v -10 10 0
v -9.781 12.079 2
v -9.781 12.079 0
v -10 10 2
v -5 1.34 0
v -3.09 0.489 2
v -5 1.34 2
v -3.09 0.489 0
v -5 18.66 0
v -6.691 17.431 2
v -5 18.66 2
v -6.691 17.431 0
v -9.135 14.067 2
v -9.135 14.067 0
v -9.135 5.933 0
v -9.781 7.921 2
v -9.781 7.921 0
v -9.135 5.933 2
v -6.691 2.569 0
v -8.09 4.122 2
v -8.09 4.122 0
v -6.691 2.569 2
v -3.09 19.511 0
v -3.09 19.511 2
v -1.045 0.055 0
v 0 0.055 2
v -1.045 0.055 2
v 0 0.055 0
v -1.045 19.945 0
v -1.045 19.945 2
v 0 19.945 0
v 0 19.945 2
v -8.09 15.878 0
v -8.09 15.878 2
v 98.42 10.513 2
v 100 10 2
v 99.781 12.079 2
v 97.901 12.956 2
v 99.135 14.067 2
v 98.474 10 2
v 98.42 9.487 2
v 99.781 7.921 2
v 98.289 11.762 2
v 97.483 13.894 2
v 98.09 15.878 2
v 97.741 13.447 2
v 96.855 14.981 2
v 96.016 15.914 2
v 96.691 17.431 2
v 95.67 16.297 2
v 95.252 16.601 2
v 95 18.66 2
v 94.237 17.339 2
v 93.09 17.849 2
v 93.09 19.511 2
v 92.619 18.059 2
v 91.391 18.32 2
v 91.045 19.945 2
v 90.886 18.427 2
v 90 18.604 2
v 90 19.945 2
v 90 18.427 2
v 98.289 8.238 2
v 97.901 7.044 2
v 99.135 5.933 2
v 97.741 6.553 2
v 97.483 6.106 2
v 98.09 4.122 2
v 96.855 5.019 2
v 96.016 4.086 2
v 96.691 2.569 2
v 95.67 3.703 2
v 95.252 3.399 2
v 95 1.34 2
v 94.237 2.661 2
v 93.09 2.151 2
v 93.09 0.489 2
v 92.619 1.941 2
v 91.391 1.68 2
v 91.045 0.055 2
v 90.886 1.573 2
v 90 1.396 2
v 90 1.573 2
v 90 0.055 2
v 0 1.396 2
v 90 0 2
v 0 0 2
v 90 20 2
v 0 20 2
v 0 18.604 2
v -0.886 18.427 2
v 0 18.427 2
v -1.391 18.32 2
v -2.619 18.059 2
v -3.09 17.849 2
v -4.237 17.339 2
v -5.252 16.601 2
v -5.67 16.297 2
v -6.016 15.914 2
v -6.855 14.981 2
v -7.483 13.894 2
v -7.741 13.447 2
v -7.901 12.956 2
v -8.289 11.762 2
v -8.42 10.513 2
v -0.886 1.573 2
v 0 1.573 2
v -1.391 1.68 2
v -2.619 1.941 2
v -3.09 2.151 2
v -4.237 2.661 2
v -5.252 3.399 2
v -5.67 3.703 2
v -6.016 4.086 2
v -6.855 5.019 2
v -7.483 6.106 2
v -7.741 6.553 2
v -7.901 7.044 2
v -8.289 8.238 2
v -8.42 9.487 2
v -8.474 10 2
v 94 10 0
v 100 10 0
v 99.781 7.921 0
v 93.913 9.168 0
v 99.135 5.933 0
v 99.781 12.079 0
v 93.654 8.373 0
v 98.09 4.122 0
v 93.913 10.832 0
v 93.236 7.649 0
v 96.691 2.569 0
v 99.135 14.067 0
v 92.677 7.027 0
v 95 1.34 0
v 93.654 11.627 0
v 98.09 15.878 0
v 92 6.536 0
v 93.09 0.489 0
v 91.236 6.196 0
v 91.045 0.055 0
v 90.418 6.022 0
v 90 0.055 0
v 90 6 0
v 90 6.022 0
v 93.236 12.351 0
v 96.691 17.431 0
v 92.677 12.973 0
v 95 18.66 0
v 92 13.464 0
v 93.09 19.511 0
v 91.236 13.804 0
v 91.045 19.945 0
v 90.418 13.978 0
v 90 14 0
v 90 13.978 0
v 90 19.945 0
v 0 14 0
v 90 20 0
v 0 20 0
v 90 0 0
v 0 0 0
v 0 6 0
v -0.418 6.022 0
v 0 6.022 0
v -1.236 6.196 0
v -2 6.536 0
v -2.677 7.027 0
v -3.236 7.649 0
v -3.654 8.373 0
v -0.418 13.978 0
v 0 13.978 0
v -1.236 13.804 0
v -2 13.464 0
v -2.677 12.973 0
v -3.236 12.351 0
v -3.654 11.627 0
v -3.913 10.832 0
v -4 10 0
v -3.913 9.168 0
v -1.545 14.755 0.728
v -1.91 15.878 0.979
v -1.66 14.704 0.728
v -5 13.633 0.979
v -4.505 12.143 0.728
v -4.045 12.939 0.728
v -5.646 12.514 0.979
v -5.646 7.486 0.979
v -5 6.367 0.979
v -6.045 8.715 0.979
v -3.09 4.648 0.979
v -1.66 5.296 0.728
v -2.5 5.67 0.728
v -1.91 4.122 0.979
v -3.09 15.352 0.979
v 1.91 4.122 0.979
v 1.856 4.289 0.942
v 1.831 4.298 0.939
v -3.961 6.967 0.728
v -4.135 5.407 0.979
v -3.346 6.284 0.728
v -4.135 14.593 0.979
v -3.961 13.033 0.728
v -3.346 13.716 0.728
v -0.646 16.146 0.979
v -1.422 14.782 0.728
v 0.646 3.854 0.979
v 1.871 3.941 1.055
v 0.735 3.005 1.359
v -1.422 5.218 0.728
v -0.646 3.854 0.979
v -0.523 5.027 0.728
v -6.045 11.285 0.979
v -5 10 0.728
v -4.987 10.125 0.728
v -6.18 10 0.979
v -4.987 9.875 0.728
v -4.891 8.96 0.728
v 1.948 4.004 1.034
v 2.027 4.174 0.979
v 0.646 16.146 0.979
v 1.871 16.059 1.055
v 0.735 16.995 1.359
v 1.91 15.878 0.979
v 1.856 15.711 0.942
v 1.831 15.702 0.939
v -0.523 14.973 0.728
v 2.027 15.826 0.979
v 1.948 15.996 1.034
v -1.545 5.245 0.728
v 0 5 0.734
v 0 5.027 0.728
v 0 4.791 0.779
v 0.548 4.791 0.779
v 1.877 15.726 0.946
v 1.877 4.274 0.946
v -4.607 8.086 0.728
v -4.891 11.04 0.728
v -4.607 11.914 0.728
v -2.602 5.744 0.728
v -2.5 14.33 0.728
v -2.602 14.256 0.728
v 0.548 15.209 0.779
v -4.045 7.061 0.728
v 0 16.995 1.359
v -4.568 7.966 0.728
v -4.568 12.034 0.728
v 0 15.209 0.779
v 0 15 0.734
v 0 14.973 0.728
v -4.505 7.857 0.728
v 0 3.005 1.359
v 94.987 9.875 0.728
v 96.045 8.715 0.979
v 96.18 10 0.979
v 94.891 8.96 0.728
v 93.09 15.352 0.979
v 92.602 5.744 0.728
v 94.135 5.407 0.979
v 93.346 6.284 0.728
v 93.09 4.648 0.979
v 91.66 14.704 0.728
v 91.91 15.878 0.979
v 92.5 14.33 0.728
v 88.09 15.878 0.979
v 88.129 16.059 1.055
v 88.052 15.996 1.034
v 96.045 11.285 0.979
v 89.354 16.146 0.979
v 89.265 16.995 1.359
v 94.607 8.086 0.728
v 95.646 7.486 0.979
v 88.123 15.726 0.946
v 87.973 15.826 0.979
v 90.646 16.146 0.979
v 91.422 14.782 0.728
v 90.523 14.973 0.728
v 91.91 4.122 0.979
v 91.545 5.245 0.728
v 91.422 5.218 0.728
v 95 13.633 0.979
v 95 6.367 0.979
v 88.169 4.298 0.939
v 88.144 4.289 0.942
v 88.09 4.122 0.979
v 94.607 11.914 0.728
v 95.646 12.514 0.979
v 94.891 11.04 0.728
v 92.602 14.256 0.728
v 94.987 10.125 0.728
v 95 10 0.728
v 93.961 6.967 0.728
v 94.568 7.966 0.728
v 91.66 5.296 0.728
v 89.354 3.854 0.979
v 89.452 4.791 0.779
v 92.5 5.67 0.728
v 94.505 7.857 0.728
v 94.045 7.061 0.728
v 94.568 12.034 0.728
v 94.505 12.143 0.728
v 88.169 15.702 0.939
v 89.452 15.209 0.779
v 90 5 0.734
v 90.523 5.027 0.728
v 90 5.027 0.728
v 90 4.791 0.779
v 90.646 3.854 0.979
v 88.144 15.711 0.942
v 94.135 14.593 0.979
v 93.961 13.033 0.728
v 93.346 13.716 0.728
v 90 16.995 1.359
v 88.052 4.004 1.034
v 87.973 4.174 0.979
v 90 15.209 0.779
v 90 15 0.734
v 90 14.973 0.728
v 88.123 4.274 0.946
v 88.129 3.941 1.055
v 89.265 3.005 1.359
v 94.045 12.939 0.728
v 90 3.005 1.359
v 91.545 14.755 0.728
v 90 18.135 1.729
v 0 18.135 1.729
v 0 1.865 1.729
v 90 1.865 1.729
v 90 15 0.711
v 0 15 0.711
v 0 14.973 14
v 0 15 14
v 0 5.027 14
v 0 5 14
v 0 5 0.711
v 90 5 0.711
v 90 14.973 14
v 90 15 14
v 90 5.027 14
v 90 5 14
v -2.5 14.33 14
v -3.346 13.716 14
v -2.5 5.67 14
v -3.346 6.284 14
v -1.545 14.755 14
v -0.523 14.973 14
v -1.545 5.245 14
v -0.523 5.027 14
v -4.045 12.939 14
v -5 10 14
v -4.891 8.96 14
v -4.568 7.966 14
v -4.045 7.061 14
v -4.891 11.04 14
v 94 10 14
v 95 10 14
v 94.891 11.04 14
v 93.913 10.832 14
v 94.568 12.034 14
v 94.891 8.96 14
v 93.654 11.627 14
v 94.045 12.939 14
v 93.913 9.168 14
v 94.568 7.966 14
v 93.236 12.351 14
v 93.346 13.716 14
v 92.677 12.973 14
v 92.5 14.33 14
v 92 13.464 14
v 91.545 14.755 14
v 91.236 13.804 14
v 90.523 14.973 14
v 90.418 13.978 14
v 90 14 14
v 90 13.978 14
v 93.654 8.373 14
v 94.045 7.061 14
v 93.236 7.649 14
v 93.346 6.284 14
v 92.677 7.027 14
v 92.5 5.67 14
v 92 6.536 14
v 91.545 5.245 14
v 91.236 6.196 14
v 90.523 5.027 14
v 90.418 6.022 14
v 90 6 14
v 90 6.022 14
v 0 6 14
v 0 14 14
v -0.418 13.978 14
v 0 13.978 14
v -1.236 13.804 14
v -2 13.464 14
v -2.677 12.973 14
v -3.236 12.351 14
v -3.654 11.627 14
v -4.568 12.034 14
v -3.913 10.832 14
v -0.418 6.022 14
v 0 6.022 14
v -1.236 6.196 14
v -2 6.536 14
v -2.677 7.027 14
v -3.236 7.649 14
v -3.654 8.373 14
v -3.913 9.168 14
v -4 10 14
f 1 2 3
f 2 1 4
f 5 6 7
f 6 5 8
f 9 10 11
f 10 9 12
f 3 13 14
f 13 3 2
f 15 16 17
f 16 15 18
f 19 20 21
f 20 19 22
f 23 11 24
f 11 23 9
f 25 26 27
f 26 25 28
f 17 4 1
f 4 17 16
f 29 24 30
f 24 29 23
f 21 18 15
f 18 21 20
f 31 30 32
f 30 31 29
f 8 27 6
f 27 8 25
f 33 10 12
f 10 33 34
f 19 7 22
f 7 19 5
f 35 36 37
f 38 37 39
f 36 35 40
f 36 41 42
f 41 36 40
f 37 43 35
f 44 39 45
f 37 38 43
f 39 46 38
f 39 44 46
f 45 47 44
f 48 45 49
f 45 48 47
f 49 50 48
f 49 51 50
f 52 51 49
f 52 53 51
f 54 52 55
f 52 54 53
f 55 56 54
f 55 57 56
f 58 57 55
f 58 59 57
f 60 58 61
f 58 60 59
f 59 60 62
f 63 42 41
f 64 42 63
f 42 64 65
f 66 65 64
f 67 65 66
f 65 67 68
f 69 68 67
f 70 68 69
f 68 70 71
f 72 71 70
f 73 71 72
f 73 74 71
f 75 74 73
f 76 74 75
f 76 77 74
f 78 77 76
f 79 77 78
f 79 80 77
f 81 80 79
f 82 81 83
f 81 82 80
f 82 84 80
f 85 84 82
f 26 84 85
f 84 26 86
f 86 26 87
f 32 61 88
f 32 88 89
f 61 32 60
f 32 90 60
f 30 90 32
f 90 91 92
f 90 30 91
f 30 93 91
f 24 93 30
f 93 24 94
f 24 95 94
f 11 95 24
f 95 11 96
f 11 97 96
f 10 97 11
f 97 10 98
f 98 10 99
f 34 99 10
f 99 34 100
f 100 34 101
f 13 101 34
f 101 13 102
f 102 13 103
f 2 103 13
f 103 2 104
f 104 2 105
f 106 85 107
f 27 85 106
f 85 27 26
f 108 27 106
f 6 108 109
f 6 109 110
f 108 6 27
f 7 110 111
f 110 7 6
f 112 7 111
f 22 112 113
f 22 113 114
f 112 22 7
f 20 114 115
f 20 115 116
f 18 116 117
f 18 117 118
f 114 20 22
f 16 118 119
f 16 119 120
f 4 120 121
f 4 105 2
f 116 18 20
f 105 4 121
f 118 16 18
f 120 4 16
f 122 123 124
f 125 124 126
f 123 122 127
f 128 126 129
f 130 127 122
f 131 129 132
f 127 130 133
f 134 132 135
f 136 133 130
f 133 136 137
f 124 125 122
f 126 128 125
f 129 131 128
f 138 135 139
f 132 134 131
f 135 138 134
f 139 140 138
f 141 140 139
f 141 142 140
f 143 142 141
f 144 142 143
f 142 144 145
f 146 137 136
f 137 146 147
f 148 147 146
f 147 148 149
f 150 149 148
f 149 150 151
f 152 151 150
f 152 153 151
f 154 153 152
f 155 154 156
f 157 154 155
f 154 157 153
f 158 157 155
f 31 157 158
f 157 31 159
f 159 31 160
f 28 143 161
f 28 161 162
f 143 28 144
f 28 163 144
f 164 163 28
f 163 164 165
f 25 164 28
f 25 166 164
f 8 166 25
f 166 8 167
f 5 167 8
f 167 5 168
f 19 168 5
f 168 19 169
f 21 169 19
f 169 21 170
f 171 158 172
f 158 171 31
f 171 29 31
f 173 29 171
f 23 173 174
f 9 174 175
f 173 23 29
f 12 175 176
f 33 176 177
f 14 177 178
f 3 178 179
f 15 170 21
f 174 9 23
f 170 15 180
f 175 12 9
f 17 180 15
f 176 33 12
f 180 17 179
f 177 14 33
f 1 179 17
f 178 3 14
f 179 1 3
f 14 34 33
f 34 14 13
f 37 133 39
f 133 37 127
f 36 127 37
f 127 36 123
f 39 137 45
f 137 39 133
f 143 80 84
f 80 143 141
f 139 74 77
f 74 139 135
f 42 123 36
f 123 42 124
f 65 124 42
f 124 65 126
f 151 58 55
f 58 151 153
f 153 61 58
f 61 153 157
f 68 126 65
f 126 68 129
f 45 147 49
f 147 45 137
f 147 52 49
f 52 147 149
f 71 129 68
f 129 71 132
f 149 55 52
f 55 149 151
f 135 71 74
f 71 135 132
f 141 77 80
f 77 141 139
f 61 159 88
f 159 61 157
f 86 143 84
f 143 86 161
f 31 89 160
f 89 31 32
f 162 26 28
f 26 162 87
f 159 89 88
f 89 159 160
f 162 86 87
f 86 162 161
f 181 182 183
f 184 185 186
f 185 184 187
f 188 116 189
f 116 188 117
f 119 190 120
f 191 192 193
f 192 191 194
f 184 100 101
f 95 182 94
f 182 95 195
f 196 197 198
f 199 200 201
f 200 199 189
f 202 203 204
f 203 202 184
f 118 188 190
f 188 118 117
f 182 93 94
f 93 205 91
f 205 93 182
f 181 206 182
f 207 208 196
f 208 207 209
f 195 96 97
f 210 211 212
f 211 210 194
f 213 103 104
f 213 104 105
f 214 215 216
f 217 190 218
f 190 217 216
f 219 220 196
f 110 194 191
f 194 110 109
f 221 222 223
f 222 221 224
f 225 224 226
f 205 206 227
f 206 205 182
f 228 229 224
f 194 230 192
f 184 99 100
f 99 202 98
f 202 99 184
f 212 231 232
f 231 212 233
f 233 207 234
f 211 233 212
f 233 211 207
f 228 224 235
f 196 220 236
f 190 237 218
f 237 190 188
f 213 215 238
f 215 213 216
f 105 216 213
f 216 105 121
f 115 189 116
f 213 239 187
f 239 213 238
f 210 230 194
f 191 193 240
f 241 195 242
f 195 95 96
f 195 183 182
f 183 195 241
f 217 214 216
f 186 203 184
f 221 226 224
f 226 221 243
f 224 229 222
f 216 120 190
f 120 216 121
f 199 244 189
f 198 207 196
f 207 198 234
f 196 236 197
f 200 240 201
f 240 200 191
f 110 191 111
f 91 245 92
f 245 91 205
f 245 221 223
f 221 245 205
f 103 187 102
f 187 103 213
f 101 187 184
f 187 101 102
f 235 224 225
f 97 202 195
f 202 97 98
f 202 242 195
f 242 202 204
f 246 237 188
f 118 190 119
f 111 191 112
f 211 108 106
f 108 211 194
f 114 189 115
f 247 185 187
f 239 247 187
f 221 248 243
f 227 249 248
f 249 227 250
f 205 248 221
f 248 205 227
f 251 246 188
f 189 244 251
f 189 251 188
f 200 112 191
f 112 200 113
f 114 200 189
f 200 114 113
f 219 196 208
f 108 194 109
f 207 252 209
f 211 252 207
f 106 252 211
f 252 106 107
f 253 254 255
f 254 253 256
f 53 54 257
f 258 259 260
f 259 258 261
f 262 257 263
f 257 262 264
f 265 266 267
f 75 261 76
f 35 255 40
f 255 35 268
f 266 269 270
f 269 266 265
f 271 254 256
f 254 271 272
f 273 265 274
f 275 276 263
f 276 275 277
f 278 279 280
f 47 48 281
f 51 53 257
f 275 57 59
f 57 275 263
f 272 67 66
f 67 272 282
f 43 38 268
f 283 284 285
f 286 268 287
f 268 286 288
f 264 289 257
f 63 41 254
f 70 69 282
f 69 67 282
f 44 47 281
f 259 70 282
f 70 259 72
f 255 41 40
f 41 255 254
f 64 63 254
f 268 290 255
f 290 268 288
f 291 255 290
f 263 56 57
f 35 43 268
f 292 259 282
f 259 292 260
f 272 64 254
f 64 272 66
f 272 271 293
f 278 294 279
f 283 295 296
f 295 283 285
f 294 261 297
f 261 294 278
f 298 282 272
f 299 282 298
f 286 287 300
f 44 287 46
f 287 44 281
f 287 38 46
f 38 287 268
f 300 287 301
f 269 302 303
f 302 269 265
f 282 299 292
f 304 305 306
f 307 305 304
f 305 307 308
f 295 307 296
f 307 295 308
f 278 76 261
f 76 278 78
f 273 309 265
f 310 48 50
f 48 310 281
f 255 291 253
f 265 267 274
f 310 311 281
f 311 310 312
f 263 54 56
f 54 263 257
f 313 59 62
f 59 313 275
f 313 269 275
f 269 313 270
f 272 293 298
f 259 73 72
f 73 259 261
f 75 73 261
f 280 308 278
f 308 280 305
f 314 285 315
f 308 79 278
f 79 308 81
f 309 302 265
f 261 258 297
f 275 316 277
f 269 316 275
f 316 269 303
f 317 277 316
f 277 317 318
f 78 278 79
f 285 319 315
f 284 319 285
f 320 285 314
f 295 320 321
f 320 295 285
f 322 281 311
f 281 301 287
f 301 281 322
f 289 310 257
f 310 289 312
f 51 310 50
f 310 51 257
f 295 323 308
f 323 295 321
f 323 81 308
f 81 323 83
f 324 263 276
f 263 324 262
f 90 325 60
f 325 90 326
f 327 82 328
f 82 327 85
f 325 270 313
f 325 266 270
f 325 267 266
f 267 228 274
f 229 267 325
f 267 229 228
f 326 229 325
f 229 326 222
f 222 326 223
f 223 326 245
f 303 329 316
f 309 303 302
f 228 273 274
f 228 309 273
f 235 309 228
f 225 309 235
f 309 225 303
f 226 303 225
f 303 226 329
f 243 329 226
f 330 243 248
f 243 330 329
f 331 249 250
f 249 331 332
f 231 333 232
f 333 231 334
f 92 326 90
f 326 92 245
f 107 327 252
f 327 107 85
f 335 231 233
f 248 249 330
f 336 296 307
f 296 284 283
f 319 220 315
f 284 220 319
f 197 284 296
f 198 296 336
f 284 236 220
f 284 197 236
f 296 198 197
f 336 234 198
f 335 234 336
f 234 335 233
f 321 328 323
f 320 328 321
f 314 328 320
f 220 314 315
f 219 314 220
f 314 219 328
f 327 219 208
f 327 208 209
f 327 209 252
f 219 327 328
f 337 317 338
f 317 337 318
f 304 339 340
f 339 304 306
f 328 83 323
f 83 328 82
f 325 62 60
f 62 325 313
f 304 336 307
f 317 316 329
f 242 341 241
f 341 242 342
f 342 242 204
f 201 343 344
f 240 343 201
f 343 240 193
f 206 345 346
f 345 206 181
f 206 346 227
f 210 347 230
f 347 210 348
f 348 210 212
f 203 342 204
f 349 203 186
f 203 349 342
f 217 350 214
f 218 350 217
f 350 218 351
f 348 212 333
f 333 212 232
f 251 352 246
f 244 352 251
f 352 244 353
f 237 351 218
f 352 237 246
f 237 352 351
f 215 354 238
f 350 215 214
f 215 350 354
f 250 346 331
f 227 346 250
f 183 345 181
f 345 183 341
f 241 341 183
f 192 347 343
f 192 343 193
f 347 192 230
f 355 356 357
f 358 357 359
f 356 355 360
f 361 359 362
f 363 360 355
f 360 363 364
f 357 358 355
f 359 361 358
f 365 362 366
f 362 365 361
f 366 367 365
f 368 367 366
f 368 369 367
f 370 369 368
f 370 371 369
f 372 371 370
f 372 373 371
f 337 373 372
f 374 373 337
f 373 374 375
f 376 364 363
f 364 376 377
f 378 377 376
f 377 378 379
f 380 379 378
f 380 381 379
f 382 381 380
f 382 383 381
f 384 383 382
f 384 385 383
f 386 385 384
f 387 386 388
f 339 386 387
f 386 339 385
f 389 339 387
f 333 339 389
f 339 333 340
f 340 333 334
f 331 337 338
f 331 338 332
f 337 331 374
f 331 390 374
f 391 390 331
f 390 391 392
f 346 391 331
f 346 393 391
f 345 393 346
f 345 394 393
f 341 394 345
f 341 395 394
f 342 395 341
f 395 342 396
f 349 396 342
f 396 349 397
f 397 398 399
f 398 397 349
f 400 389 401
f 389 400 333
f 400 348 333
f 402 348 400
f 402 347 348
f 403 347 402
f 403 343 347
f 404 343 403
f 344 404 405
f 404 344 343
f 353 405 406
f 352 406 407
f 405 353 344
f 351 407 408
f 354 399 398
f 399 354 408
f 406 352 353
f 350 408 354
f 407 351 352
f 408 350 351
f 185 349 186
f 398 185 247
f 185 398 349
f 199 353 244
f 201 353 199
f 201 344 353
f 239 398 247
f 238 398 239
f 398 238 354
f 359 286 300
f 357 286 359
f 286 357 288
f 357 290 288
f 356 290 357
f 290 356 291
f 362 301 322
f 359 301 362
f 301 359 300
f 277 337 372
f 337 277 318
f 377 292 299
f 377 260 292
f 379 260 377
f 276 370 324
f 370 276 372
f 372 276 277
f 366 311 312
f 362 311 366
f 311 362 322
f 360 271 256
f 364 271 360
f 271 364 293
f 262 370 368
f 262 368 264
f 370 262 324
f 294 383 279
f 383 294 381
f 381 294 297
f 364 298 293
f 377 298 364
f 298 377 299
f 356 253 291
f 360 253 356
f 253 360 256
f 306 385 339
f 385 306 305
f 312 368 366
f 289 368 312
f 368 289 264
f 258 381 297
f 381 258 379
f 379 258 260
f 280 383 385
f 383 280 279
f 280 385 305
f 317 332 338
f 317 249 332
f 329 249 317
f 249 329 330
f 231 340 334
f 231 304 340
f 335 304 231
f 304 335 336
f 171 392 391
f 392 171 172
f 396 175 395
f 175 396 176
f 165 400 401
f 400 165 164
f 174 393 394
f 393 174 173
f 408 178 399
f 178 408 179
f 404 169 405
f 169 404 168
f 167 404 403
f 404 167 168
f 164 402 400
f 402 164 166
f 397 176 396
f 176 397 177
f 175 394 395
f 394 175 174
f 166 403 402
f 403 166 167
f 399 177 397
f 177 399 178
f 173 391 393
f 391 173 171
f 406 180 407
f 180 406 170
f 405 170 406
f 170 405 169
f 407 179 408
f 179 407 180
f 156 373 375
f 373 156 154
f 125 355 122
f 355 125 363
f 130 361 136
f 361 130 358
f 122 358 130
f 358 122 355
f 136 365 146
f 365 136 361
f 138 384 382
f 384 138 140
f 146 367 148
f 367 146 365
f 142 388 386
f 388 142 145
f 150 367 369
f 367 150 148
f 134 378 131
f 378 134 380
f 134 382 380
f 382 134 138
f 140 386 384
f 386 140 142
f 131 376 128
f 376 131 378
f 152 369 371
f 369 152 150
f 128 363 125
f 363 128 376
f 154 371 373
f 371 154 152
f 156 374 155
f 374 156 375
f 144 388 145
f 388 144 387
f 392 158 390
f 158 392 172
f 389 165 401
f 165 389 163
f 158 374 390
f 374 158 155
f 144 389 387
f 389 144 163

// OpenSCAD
// That part for Prit's car vent.
//
//  Copyright 2011 John Cooper 
//
//  This program is free software: you can redistribute it and/or modify
//  it under the terms of the GNU General Public License as published by
//  the Free Software Foundation, either version 3 of the License, or
//   (at your option) any later version.
//
//  This program is distributed in the hope that it will be useful,
//  but WITHOUT ANY WARRANTY; without even the implied warranty of
//  MERCHANTABILITY or FITNESS FOR A PARTICULAR PURPOSE.  See the
//  GNU General Public License for more details.
//
//  You should have received a copy of the GNU General Public License
//  along with this program.  If not, see <http://www.gnu.org/licenses/>.

$fs=0.2;

top_len=110;
top_width=20;
inner_len=100;
inner_width=10;
inner_height=14;
inner_thickness=2;

module oblong(len,width,height) {
  union() {
    cube([len - (width), width, height]);
    for ( l = [0, 1] ) {
      translate([l * (len - (width)), width/2, 0]) {
        cylinder(r=width/2, h=height);
      }
    }
  }
}

module scoop_out() {
  translate([0, top_width/2, top_width]) {
    rotate([0,90,0]) {
      cylinder(r=20, h=inner_len - inner_width);
    }
  }
  for ( l = [0, 1] ) {
    translate([l * (inner_len - top_width/2),top_width/2,top_width ]) {
      sphere(r=top_width);
    }
  }
}

difference() {
  union() {
    difference() {
      // Top flange
      oblong(top_len, top_width, 2);
      scoop_out();
    }
    translate ([0,(top_width - inner_width)/2,0]) {
      // Insert
      oblong(inner_len, inner_width, inner_height);
    }
  }
  translate([0, (top_width - inner_width + inner_thickness)/2, -0.5]) {
    // Insert cut out
    oblong(inner_len - inner_thickness, inner_width - inner_thickness, inner_height+1);
  }
}
